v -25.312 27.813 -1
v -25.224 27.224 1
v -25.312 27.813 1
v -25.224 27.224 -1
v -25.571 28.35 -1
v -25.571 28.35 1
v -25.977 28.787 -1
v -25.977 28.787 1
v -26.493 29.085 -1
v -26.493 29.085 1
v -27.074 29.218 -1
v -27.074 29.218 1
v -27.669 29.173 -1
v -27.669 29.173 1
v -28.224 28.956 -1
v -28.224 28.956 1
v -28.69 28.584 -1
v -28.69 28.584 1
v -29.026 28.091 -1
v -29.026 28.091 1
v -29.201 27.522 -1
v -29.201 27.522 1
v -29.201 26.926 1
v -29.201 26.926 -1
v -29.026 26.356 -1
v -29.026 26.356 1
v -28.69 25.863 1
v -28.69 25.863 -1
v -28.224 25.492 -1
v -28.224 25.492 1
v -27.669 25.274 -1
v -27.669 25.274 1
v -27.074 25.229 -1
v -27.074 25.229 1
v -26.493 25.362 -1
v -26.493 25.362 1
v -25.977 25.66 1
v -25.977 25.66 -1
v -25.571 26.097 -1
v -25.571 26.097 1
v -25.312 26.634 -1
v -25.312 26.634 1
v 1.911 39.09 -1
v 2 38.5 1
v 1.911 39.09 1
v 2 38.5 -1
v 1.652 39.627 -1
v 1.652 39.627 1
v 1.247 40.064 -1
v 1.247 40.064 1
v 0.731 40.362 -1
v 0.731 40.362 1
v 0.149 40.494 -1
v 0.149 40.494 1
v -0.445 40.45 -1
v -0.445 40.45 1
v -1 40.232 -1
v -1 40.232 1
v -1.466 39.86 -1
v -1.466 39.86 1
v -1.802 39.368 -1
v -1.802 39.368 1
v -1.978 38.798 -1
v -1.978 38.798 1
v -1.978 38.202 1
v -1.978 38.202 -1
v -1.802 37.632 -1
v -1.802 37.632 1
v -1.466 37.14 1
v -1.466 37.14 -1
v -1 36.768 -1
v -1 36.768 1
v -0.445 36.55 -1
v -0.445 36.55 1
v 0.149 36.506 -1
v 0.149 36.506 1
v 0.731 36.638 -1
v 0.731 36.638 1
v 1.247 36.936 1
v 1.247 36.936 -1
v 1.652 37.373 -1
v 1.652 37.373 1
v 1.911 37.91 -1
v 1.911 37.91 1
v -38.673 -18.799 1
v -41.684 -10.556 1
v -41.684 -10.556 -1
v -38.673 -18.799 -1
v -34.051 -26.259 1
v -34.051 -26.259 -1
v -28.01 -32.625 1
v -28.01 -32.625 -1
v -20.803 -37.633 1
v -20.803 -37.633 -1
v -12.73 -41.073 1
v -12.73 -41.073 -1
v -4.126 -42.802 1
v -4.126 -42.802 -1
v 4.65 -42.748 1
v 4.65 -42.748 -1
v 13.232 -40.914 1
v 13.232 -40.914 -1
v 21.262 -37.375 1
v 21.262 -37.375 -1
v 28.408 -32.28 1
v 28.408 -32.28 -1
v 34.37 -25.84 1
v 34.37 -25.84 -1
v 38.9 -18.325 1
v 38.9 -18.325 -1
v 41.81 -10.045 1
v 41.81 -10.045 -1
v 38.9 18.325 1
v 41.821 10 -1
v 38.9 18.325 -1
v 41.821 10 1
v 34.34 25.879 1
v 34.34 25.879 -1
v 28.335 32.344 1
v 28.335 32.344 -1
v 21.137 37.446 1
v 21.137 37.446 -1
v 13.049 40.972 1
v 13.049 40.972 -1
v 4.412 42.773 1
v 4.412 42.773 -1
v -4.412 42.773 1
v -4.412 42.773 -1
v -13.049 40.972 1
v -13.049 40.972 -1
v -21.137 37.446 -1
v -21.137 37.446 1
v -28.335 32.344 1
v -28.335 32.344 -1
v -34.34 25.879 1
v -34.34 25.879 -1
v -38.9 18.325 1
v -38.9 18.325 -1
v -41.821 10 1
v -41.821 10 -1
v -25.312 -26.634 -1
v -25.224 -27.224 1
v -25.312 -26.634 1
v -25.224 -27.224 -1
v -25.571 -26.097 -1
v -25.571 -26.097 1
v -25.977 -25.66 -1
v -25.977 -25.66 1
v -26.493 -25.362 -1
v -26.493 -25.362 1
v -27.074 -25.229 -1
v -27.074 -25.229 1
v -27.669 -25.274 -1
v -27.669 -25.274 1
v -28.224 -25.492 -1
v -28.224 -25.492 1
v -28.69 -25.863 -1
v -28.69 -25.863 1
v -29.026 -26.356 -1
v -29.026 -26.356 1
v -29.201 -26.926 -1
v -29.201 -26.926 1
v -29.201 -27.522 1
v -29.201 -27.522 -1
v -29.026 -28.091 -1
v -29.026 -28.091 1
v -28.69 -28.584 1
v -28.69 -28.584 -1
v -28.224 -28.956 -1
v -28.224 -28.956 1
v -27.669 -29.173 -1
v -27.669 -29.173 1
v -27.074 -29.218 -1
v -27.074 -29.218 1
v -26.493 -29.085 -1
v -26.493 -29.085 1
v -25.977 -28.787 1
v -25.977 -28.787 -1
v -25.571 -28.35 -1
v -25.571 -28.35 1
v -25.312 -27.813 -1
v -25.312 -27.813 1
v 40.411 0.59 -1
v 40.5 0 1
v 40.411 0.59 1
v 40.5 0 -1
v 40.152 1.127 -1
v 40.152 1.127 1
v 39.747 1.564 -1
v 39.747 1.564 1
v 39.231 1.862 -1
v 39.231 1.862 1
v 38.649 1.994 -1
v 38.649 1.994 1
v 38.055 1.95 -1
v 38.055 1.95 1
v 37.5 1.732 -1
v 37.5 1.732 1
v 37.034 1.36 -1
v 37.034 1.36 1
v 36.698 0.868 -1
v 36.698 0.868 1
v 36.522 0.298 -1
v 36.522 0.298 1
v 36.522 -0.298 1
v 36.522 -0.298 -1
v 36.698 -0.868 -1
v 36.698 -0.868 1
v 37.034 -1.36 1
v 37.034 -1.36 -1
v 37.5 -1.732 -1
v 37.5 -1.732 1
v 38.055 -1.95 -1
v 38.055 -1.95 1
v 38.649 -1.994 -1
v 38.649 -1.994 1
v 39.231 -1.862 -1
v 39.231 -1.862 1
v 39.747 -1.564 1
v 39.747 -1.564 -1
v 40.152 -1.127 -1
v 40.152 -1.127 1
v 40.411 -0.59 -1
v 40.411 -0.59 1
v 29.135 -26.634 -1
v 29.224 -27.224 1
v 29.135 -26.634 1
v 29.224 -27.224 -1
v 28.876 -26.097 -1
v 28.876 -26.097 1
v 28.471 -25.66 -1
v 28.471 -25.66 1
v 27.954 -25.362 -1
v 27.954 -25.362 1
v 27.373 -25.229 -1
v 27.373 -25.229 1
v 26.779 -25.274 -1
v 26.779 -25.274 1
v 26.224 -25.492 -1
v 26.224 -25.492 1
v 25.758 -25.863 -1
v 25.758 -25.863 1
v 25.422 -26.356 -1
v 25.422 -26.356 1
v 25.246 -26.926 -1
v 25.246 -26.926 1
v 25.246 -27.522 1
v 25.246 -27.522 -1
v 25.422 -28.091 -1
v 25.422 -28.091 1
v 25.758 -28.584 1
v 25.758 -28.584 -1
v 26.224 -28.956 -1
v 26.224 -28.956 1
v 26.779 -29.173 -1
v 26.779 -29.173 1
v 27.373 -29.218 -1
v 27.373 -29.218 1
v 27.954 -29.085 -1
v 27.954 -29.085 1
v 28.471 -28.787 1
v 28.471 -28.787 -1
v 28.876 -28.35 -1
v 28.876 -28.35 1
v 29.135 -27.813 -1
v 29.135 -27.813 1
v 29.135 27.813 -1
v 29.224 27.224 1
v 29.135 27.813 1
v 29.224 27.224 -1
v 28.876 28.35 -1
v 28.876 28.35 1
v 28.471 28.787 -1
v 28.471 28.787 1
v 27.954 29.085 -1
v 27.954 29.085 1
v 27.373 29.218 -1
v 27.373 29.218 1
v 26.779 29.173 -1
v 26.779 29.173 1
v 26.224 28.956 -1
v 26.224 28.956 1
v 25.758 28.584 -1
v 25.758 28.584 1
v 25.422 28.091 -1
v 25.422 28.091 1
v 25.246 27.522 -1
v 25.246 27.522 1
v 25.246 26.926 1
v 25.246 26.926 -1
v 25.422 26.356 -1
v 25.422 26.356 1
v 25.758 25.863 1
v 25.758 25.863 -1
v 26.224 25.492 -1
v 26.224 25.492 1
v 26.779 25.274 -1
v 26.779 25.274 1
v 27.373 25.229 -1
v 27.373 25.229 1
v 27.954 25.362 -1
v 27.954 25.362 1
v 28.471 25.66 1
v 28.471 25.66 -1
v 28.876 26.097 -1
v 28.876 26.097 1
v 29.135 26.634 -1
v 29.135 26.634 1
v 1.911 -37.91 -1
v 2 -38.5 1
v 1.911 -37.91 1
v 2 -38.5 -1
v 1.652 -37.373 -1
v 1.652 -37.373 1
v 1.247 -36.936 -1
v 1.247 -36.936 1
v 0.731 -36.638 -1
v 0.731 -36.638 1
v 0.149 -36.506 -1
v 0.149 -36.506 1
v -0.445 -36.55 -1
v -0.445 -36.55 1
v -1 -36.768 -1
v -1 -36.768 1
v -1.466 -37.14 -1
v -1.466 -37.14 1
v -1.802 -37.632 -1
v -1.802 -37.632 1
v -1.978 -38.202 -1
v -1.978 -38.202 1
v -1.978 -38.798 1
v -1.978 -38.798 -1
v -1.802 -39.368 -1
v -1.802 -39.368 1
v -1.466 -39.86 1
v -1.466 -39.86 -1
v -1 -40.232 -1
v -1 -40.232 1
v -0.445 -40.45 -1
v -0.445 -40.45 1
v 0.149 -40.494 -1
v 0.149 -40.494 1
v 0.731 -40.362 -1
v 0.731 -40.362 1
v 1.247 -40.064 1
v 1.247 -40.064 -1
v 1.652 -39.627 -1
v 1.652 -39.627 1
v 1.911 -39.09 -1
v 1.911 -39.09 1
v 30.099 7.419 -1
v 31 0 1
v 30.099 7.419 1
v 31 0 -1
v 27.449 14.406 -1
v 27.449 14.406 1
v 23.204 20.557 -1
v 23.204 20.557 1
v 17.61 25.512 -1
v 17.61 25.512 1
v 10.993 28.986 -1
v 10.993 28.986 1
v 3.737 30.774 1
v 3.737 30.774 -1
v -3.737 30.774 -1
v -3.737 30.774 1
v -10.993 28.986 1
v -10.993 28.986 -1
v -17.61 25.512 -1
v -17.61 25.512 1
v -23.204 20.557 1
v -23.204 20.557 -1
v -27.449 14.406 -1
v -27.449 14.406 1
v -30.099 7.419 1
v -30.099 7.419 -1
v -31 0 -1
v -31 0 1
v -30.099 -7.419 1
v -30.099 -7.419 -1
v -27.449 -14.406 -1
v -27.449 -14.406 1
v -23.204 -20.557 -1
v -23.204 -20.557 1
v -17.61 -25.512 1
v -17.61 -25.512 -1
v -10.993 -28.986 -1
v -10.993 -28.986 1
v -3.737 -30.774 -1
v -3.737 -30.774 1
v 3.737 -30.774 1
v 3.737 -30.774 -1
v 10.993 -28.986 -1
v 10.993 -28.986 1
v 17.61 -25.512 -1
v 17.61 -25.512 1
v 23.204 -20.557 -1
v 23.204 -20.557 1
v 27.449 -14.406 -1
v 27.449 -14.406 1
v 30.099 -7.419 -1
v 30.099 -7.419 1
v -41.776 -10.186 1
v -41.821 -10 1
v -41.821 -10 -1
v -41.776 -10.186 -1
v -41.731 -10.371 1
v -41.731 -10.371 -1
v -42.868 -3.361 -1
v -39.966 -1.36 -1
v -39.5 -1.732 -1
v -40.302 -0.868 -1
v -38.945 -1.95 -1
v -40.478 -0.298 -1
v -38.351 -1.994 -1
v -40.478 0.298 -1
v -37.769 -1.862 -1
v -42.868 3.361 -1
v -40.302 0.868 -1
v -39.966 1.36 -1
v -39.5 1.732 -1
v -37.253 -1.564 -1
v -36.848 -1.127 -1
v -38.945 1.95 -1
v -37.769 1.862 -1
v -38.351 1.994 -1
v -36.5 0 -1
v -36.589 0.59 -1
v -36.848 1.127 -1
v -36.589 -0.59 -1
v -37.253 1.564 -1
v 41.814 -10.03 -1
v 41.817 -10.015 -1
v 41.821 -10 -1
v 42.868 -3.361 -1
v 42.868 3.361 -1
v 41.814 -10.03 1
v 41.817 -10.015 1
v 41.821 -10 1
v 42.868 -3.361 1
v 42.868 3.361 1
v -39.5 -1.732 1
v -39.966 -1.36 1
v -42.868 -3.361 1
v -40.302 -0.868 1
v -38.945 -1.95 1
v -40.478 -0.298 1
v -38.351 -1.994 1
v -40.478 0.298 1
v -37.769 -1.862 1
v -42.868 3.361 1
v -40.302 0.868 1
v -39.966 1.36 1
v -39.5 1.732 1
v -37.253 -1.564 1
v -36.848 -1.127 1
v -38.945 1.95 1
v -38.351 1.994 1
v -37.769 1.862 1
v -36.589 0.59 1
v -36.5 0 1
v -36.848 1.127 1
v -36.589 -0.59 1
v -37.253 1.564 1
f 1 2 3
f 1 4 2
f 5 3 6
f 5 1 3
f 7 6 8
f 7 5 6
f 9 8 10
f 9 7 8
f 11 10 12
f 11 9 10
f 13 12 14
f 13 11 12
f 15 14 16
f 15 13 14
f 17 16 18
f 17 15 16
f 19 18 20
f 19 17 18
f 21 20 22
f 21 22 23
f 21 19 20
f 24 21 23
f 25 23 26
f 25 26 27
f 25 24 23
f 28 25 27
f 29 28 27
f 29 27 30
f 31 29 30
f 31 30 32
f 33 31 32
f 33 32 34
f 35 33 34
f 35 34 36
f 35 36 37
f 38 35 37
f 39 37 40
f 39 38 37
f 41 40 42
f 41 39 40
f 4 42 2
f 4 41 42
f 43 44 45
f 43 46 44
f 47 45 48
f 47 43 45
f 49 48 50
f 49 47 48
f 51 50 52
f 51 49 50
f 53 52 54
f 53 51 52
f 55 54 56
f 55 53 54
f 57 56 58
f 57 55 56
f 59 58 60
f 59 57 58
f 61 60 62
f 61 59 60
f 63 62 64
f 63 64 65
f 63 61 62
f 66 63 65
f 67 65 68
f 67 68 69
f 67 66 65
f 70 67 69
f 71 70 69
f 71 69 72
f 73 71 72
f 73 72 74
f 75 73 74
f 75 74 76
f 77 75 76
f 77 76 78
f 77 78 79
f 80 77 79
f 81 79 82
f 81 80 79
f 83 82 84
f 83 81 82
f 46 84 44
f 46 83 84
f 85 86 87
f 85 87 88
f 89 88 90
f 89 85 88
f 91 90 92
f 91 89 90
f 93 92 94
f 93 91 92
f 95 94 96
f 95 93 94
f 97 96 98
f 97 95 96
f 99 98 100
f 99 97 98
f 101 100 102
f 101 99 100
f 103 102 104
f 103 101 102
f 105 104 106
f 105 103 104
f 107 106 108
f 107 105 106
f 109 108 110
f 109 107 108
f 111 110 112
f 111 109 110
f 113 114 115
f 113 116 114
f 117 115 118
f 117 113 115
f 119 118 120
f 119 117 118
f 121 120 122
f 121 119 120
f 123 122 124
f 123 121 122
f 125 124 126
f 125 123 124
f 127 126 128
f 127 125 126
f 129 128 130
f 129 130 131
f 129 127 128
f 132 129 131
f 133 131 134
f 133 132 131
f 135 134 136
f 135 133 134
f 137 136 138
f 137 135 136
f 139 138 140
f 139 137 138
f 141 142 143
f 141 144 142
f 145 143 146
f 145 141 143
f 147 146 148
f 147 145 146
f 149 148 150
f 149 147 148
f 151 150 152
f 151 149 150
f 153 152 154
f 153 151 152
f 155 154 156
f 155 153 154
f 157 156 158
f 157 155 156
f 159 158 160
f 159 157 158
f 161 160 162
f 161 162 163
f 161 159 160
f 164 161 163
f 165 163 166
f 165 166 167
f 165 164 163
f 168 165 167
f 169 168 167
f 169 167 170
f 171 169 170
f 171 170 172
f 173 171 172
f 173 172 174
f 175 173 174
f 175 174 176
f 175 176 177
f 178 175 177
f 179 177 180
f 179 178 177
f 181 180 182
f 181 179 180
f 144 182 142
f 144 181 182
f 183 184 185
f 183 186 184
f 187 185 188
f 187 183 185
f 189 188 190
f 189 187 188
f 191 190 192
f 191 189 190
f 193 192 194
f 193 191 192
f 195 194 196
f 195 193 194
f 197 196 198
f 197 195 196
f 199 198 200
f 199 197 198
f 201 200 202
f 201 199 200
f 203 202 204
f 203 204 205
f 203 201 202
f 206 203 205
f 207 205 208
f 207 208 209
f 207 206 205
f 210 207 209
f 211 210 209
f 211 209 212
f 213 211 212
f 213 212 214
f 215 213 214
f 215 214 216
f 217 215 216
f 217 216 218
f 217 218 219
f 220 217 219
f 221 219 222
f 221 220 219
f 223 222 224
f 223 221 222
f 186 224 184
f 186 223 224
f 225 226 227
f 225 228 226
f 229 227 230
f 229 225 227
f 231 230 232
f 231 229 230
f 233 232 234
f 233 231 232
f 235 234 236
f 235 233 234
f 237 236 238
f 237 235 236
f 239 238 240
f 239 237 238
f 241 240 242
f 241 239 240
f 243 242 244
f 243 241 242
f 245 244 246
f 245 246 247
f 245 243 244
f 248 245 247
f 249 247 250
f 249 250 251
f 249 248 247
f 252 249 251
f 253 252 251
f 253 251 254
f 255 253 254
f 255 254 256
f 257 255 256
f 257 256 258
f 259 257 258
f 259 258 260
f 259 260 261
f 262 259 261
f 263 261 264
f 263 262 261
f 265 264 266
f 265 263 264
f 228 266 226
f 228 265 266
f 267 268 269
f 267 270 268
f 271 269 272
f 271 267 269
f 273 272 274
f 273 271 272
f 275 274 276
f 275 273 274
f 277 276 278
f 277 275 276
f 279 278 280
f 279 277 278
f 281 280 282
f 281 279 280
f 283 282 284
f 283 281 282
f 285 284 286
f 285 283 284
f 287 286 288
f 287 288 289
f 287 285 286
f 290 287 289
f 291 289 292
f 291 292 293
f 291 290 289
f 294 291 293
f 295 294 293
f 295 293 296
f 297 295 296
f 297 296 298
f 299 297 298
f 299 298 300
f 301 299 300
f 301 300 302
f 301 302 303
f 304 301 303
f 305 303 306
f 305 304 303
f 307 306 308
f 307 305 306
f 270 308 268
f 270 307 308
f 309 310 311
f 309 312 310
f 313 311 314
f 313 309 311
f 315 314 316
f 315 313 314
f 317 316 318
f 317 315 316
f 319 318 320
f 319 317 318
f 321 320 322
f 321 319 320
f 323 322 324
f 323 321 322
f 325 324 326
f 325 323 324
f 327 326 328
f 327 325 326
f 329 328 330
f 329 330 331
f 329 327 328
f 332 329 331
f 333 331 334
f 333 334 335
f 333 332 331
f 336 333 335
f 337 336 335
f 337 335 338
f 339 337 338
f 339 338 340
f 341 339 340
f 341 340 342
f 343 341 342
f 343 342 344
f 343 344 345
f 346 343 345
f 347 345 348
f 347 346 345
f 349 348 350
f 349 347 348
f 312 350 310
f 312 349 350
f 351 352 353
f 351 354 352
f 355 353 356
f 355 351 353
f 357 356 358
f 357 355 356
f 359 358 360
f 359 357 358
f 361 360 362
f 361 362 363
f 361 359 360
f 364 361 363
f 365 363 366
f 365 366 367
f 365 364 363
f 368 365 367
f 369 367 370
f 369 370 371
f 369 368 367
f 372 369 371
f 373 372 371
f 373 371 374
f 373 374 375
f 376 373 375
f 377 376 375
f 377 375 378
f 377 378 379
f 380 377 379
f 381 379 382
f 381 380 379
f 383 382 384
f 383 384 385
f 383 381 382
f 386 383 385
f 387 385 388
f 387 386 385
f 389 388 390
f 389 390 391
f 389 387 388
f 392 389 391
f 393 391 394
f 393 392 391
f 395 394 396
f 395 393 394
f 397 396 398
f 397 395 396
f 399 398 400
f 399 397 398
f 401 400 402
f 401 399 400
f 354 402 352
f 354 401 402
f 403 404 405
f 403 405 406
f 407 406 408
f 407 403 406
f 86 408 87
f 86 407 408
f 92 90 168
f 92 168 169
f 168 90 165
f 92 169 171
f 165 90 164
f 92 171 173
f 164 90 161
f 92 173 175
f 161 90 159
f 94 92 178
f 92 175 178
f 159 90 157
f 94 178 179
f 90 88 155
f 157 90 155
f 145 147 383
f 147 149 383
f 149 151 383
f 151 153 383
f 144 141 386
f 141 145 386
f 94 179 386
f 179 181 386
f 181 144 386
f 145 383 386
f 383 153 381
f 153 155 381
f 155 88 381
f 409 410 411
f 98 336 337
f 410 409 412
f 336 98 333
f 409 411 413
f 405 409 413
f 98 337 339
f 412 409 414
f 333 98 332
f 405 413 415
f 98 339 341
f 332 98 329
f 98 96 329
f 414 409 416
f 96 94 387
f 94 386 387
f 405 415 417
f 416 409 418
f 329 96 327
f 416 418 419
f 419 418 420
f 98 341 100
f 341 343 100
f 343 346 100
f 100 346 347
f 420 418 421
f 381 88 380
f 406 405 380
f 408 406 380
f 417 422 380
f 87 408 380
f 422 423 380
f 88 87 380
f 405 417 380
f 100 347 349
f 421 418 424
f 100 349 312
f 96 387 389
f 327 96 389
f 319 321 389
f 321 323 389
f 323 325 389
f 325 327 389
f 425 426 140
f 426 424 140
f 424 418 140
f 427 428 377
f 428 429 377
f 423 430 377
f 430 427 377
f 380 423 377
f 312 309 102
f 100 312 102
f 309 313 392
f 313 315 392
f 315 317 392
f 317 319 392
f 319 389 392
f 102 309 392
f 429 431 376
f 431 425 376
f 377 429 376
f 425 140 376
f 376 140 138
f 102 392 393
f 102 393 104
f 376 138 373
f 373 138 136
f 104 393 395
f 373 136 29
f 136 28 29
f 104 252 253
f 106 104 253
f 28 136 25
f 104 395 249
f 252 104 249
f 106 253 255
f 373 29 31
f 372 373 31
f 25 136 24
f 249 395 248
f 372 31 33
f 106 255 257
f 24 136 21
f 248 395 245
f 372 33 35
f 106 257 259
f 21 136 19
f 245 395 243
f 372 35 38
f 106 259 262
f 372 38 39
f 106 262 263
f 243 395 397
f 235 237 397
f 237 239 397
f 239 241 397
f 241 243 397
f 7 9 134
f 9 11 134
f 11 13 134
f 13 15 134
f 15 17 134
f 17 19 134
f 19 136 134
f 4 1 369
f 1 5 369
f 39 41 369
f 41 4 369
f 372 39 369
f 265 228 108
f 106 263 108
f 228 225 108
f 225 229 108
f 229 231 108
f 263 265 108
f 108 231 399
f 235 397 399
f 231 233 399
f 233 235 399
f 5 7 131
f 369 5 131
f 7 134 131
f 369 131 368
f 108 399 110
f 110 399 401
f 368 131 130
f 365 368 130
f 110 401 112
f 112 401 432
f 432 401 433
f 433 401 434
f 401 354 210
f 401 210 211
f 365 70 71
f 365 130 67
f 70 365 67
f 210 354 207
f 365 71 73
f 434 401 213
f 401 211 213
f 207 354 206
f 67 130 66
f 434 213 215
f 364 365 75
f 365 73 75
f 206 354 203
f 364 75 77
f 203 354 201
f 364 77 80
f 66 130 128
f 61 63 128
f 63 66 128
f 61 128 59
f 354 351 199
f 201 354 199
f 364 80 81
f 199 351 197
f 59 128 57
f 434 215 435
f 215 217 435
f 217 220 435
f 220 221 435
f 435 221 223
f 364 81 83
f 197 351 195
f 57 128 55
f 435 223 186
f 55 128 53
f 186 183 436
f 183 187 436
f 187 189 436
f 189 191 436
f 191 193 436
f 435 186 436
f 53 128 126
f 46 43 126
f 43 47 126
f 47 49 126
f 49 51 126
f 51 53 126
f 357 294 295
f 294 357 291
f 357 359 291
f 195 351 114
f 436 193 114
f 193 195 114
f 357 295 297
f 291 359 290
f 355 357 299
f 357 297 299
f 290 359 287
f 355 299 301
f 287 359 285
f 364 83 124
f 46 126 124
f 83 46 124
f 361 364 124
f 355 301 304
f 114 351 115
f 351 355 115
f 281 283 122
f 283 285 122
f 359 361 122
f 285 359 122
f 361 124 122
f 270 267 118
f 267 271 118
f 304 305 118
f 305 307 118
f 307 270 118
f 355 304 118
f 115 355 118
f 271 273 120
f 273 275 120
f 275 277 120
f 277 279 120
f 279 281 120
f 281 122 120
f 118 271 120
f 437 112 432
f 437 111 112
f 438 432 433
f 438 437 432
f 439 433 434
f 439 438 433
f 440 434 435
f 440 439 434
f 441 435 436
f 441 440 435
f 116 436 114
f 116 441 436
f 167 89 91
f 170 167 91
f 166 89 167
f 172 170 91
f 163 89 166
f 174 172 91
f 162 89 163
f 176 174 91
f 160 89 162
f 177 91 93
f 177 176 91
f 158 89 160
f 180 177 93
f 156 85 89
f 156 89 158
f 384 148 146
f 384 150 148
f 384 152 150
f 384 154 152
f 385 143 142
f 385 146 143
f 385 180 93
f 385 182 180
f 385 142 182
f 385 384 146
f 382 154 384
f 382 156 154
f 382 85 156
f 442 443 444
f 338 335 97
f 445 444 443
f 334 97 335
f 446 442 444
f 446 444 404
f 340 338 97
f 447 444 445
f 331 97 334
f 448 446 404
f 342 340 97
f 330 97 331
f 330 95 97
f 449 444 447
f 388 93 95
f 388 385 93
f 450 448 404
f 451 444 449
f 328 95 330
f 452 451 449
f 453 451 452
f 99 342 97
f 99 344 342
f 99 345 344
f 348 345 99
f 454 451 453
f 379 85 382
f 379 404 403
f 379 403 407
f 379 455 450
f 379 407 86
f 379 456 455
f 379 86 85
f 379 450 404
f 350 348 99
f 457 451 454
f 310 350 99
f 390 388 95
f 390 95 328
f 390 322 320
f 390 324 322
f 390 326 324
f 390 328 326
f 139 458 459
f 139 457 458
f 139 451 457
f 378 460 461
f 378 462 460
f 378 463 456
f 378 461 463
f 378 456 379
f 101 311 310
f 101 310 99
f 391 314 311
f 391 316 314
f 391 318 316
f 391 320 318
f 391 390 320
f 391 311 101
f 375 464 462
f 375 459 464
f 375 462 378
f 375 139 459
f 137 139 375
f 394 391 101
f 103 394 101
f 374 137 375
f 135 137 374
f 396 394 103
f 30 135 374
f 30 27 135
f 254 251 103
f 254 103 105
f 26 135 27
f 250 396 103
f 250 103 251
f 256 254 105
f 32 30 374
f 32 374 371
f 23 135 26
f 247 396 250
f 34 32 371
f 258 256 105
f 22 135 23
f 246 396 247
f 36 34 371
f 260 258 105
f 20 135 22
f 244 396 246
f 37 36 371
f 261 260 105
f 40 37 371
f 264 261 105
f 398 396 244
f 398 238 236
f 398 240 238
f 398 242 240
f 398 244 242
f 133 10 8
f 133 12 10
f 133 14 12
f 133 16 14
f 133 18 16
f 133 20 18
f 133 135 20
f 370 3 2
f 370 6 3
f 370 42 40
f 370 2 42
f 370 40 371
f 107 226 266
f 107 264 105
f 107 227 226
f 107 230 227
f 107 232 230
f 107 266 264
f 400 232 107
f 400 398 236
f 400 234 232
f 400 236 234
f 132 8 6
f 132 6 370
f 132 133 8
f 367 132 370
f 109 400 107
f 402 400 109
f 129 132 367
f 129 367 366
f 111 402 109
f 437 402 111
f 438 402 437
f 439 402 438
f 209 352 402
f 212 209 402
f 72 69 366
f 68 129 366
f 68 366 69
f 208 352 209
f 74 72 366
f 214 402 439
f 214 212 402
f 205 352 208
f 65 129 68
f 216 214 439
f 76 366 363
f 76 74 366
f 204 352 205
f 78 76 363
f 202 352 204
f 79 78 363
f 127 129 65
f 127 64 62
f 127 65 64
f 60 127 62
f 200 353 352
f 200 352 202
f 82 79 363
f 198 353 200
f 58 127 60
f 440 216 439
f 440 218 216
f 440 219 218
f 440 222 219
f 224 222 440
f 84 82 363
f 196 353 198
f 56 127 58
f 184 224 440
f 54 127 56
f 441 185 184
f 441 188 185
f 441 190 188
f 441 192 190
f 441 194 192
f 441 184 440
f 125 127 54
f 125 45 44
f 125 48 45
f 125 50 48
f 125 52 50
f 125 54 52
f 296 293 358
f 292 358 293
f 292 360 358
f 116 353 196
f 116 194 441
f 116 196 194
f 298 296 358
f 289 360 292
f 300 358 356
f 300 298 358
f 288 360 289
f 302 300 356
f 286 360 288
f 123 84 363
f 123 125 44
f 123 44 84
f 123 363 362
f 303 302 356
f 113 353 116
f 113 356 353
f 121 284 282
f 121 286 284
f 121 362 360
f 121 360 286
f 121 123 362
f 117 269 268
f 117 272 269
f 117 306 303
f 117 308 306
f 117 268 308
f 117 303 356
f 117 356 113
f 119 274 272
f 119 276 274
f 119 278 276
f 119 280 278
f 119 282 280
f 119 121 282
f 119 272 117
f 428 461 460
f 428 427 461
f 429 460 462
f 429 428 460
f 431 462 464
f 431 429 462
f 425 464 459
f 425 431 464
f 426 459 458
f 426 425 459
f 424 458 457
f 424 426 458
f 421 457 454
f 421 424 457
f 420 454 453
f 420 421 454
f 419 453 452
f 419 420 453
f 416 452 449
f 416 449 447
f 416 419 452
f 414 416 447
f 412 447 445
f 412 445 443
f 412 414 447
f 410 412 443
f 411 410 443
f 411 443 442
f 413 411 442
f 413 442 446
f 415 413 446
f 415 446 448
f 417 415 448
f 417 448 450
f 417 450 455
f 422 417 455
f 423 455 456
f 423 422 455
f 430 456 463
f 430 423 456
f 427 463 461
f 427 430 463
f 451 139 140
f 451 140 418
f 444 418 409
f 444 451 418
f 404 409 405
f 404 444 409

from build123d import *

# Parameters (mm, degrees)
SKETCH1_R           = 2
SKETCH1_R_2         = 31
BOSS_EXTRUDE1_DEPTH = 1


with BuildPart() as part:
    # Sketch1 → Boss-Extrude1 (new, symmetric)
    with BuildSketch(Plane.XY):
        with BuildLine():
            ThreePointArc((41.821047333, 10), (0, 43), (-41.821047333, 10))
            ThreePointArc((-41.821047333, 10), (-43, 0), (-41.821047333, -10))
            ThreePointArc((-41.821047333, -10), (-41.753494763, -10.278408199), (-41.684088814, -10.556360154))
            ThreePointArc((-41.684088814, -10.556360154), (0.263191219, -42.999194532), (41.810188324, -10.045304987))
            ThreePointArc((41.810188324, -10.045304987), (41.815623964, -10.022653964), (41.821047333, -10))
            ThreePointArc((41.821047333, -10), (43, 0), (41.821047333, 10))
        make_face()
        with Locations((-27.223611076, -27.223611076)):
            Circle(SKETCH1_R, mode=Mode.SUBTRACT)
        with Locations((0, -38.5)):
            Circle(SKETCH1_R, mode=Mode.SUBTRACT)
        with Locations((27.223611076, -27.223611076)):
            Circle(SKETCH1_R, mode=Mode.SUBTRACT)
        with Locations((-38.5, 0)):
            Circle(SKETCH1_R, mode=Mode.SUBTRACT)
        with Locations((-27.223611076, 27.223611076)):
            Circle(SKETCH1_R, mode=Mode.SUBTRACT)
        Circle(SKETCH1_R_2, mode=Mode.SUBTRACT)
        with Locations((38.5, 0)):
            Circle(SKETCH1_R, mode=Mode.SUBTRACT)
        with Locations((27.223611076, 27.223611076)):
            Circle(SKETCH1_R, mode=Mode.SUBTRACT)
        with Locations((0, 38.5)):
            Circle(SKETCH1_R, mode=Mode.SUBTRACT)
    extrude(amount=BOSS_EXTRUDE1_DEPTH, both=True)


solid = part.part
